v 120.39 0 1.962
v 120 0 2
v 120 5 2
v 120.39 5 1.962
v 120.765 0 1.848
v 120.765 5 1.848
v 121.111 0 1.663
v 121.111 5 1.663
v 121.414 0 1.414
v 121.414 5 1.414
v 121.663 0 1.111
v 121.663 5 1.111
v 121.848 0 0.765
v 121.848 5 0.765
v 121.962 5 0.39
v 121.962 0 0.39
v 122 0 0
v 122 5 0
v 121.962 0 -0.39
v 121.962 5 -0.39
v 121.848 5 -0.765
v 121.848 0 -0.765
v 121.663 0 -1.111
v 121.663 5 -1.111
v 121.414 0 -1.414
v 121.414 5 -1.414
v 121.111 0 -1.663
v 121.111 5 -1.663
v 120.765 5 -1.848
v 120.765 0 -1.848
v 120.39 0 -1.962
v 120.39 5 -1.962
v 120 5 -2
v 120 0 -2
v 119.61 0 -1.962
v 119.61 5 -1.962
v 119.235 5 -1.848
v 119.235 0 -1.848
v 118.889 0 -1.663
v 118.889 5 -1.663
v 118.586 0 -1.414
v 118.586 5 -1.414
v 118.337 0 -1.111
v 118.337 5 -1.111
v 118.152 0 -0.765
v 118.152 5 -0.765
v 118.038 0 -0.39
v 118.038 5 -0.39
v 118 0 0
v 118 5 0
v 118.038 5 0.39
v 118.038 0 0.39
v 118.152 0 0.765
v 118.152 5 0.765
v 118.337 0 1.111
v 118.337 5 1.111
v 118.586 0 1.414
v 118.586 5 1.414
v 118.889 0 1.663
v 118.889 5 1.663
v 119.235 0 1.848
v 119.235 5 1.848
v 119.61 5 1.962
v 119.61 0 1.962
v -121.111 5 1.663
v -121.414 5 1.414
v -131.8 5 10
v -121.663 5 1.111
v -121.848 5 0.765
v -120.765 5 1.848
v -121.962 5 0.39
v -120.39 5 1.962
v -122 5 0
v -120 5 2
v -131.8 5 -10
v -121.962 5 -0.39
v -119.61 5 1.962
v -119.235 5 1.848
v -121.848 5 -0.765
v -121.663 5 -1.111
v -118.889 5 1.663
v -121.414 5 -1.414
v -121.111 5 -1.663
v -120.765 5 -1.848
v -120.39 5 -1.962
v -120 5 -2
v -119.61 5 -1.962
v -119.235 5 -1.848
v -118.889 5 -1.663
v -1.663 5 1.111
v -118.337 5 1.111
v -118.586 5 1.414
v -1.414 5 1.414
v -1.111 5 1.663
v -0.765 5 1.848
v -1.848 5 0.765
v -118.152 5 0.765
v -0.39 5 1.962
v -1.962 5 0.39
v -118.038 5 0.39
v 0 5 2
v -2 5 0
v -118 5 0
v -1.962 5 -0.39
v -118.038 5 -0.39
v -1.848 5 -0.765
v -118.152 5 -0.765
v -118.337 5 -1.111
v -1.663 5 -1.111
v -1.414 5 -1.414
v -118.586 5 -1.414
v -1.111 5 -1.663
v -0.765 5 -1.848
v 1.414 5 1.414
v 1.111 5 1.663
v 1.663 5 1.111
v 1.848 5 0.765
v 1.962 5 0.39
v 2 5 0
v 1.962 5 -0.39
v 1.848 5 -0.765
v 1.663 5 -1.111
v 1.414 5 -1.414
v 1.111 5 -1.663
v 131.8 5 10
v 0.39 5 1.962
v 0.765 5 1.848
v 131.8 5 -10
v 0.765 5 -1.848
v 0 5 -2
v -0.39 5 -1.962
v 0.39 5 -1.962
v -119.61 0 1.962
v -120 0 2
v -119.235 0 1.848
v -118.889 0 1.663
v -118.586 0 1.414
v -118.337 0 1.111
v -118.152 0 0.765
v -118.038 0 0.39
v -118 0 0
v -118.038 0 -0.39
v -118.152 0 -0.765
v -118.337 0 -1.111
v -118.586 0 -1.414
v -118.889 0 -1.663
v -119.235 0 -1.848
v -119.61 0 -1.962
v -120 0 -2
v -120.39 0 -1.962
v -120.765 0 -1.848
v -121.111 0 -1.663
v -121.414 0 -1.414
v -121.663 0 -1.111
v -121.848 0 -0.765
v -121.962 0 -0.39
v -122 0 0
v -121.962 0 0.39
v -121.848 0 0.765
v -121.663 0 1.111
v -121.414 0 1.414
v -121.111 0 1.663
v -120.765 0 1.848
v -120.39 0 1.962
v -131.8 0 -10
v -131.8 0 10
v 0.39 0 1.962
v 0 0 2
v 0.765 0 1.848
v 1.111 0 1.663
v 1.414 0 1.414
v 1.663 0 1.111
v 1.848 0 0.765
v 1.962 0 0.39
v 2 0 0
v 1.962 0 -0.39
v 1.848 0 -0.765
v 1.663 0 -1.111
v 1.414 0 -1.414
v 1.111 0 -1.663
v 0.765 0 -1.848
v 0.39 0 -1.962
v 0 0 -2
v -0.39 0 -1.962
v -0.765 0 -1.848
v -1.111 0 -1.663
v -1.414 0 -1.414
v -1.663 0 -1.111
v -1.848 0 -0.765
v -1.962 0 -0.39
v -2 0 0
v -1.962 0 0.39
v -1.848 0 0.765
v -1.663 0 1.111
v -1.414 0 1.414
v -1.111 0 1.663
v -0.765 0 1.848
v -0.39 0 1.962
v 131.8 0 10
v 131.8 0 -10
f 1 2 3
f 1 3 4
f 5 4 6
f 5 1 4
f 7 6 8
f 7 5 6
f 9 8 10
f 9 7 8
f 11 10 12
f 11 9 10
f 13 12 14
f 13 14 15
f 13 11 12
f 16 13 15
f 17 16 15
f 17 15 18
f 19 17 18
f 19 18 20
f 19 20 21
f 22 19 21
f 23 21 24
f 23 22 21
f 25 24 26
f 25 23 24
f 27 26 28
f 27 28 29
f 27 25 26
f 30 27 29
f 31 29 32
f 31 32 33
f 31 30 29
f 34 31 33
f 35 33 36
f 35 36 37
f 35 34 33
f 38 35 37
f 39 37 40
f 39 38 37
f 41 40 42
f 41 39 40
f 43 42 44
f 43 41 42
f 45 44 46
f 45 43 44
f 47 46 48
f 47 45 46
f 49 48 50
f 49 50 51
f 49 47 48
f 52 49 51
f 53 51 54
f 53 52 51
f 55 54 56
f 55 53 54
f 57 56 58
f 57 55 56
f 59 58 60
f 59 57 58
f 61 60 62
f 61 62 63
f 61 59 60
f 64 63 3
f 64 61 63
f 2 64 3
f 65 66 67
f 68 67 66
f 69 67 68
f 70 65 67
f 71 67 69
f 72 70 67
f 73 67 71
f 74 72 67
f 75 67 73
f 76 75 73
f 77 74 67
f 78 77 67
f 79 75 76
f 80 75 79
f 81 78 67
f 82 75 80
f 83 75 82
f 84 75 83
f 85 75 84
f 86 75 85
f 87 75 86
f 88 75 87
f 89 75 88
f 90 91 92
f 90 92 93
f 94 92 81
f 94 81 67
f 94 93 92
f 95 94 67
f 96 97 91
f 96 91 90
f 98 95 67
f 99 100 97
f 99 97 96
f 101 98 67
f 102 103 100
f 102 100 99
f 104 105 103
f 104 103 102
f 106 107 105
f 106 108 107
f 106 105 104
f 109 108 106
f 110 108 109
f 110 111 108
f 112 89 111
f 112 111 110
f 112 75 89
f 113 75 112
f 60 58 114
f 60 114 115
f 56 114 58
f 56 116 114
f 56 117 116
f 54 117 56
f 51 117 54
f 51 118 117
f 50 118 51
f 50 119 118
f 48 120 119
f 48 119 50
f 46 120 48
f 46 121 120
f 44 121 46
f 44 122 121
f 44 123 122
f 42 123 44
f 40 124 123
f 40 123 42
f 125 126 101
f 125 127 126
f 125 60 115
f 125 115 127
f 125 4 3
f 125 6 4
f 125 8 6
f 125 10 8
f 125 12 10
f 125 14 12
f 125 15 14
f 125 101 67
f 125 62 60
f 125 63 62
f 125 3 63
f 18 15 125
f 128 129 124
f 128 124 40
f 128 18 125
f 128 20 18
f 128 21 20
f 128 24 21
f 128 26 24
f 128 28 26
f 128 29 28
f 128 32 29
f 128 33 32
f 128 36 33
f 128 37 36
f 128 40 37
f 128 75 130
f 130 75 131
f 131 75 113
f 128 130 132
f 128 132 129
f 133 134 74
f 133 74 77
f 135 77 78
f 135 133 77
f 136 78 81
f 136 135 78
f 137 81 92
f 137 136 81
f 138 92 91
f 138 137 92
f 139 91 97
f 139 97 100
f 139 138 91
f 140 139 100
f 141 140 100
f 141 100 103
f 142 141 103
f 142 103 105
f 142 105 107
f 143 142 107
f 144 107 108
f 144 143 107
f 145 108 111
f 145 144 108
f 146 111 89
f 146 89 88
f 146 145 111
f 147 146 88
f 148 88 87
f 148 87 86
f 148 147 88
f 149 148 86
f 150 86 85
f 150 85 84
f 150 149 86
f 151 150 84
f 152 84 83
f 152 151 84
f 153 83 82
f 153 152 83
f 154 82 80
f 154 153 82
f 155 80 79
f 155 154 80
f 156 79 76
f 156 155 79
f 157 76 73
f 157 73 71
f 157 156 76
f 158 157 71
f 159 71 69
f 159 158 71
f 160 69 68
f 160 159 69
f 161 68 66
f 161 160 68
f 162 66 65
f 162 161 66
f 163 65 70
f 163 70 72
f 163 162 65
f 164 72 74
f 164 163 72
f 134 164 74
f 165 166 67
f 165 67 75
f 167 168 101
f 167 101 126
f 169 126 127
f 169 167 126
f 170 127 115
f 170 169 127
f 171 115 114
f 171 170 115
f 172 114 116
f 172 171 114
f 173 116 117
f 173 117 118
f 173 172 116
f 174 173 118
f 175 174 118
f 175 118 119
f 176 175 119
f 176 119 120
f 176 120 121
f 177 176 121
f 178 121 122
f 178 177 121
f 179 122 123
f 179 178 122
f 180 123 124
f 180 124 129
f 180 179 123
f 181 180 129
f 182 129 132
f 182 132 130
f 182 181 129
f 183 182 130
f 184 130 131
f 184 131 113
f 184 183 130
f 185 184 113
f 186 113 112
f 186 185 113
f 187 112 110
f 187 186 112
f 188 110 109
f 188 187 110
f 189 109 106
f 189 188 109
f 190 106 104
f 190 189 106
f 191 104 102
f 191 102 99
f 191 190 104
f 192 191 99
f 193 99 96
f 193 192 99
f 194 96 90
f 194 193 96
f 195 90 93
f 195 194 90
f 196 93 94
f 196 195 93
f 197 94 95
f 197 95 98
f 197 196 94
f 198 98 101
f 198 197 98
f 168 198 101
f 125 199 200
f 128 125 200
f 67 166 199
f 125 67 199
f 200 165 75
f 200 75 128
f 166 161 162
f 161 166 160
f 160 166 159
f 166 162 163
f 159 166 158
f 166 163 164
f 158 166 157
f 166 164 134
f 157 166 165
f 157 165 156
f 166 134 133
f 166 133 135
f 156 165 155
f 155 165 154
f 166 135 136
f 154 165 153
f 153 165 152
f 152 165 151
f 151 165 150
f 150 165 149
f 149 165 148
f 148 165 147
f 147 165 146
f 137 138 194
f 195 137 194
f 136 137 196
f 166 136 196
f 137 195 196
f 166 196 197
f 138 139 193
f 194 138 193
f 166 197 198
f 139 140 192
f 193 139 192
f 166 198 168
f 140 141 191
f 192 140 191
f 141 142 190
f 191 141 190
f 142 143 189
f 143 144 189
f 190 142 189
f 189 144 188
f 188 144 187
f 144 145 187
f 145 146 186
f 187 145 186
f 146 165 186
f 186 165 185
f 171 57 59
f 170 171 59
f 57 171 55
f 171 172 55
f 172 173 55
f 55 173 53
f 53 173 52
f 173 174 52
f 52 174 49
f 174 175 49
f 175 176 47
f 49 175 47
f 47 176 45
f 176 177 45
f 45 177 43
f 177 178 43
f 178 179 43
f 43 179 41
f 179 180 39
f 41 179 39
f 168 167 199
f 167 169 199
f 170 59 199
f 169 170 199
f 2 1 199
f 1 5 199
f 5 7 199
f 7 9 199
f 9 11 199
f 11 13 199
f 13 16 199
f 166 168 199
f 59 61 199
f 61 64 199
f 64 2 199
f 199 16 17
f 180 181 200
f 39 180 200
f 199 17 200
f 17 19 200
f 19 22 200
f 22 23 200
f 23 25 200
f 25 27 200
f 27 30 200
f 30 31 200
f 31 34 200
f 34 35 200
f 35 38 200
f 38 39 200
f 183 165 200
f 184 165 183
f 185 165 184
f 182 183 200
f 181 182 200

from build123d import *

# Parameters (mm, degrees)
SKETCH1_4_W         = 263.6
SKETCH1_4_H         = 20
SKETCH1_4_R         = 2
BOSS_EXTRUDE3_DEPTH = 5


with BuildPart() as part:
    # Sketch1<4> → Boss-Extrude3 (new body)
    with BuildSketch(Plane(origin=(0, 0, 0), x_dir=(1, 0, 0), z_dir=(0, 1, 0))):
        Rectangle(SKETCH1_4_W, SKETCH1_4_H)
        with Locations((-120, 0)):
            Circle(SKETCH1_4_R, mode=Mode.SUBTRACT)
        Circle(SKETCH1_4_R, mode=Mode.SUBTRACT)
        with Locations((120, 0)):
            Circle(SKETCH1_4_R, mode=Mode.SUBTRACT)
    extrude(amount=BOSS_EXTRUDE3_DEPTH)


solid = part.part
